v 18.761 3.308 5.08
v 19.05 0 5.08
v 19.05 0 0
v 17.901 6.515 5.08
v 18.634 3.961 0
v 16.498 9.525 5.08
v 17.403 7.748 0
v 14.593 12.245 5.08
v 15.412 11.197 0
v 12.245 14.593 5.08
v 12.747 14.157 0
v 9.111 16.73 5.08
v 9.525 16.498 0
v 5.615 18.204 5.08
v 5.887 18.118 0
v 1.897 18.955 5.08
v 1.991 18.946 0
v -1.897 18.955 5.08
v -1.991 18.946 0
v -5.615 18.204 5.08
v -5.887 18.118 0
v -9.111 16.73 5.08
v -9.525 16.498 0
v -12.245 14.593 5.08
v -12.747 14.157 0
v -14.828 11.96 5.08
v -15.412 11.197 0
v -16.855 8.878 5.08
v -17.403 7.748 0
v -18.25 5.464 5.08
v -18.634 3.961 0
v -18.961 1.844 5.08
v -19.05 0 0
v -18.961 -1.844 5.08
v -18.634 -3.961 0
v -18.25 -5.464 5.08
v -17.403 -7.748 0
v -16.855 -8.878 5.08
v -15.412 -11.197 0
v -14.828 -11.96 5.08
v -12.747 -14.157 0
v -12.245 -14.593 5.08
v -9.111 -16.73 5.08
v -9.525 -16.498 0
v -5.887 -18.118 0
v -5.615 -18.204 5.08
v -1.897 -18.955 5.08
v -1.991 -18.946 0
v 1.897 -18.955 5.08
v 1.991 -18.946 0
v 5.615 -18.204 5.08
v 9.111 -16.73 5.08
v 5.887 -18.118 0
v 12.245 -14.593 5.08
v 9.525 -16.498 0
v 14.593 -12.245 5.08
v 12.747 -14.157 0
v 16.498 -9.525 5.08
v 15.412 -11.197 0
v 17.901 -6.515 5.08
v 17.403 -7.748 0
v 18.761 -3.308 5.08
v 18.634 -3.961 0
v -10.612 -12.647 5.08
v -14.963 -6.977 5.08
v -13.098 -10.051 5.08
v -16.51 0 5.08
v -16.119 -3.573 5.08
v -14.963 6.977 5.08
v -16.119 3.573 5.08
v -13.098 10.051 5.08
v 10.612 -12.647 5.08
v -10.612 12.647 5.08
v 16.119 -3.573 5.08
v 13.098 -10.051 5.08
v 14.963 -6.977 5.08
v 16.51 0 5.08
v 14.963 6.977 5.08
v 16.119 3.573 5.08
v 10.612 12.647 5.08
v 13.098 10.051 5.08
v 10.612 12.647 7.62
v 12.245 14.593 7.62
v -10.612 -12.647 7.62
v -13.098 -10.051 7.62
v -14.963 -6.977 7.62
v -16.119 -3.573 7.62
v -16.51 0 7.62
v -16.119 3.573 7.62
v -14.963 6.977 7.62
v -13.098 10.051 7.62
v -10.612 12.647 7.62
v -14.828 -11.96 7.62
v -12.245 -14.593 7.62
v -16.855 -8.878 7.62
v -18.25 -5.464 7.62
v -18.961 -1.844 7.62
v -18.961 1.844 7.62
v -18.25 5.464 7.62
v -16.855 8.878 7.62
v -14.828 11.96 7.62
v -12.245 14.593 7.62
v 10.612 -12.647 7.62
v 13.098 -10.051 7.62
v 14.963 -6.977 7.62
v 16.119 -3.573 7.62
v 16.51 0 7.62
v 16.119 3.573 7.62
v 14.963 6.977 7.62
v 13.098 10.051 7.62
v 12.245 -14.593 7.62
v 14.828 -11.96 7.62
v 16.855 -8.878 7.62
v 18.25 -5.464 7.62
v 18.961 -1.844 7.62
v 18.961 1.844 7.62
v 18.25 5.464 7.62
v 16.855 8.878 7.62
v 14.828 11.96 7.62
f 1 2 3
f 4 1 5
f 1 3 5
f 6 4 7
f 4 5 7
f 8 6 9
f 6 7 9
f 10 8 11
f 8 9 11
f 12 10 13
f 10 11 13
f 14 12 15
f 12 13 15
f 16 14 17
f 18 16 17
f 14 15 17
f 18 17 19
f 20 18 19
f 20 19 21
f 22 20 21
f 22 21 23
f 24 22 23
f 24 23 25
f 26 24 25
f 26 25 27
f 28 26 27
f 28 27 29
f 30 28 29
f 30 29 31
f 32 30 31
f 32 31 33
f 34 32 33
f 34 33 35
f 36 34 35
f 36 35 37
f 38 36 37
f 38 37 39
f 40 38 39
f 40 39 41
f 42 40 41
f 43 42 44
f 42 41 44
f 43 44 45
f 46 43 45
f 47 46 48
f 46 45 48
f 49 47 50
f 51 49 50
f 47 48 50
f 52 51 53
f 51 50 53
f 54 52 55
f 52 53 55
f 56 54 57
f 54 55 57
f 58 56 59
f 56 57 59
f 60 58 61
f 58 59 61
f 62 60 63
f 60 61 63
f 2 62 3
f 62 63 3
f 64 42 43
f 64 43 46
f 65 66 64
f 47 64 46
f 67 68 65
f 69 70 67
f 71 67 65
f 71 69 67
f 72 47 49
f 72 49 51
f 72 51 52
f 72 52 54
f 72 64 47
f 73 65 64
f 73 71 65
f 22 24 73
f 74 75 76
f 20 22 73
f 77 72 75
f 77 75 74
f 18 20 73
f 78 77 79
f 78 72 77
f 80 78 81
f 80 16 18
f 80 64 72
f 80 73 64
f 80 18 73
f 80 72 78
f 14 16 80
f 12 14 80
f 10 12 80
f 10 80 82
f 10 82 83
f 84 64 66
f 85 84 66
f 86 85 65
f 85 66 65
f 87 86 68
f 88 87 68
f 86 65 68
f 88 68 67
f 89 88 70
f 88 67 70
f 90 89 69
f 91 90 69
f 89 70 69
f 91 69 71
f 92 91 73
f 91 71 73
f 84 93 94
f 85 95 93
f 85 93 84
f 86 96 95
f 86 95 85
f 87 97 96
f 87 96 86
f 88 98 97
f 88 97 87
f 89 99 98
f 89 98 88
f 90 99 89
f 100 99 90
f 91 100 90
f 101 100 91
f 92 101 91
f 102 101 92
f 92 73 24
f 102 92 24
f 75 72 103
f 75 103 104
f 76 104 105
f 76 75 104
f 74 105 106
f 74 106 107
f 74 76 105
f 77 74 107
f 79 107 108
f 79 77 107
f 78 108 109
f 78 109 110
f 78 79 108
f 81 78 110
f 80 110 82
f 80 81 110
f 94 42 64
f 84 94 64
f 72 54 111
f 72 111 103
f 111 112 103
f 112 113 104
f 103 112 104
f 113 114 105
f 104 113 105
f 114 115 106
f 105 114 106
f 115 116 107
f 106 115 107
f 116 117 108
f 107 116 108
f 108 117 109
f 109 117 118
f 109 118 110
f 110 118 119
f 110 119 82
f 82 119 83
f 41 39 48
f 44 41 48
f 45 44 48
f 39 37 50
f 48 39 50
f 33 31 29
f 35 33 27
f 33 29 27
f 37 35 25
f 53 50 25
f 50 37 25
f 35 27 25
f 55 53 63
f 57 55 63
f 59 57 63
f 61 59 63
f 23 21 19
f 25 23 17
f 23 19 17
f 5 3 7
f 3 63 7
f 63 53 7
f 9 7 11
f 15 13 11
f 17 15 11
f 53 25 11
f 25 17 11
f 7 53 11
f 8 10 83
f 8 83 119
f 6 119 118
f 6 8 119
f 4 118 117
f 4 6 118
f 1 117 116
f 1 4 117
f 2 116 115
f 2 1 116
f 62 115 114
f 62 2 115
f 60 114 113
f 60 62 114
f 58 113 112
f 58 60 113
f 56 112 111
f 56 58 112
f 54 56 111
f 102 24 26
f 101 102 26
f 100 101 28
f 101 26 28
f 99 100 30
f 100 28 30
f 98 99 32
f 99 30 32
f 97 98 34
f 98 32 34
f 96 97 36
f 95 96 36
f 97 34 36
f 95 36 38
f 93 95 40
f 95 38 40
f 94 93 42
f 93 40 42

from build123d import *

# Parameters (mm, degrees)
F0_R     = 19.05
F1_DEPTH = 5.08
F3_DEPTH = 2.54


# Not quite as in the source:
# - a pattern or mirror of a feature is missing from the dataset's text; its kind, count and spacing are read off the source's solid


with BuildPart() as f1:
    # F0 (on Top) → F1 (new body)
    with BuildSketch(Plane.XY):
        Circle(F0_R)
    extrude(amount=F1_DEPTH)

    # F2 (on face) → F3 (join)
    with BuildSketch(Plane.XY.offset(5.08)):
        with BuildLine():
            ThreePointArc((-10.6124234359, -12.6473937559), (-16.51, 0), (-10.6124234359, 12.6473937559))
            Line((-10.6124234359, 12.6473937559), (-12.2451039645, 14.5931466414))
            ThreePointArc((-12.2451039645, 14.5931466414), (-19.05, 0), (-12.2451039645, -14.5931466414))
            Line((-12.2451039645, -14.5931466414), (-10.6124234359, -12.6473937559))
        make_face()
    f3 = extrude(amount=F3_DEPTH)

    # F3_copies: F3 across plane
    add(f3.mirror(Plane(origin=(0, 0, 0), x_dir=(0, 0, 1), z_dir=(1, 0, 0))))


solid = f1.part
